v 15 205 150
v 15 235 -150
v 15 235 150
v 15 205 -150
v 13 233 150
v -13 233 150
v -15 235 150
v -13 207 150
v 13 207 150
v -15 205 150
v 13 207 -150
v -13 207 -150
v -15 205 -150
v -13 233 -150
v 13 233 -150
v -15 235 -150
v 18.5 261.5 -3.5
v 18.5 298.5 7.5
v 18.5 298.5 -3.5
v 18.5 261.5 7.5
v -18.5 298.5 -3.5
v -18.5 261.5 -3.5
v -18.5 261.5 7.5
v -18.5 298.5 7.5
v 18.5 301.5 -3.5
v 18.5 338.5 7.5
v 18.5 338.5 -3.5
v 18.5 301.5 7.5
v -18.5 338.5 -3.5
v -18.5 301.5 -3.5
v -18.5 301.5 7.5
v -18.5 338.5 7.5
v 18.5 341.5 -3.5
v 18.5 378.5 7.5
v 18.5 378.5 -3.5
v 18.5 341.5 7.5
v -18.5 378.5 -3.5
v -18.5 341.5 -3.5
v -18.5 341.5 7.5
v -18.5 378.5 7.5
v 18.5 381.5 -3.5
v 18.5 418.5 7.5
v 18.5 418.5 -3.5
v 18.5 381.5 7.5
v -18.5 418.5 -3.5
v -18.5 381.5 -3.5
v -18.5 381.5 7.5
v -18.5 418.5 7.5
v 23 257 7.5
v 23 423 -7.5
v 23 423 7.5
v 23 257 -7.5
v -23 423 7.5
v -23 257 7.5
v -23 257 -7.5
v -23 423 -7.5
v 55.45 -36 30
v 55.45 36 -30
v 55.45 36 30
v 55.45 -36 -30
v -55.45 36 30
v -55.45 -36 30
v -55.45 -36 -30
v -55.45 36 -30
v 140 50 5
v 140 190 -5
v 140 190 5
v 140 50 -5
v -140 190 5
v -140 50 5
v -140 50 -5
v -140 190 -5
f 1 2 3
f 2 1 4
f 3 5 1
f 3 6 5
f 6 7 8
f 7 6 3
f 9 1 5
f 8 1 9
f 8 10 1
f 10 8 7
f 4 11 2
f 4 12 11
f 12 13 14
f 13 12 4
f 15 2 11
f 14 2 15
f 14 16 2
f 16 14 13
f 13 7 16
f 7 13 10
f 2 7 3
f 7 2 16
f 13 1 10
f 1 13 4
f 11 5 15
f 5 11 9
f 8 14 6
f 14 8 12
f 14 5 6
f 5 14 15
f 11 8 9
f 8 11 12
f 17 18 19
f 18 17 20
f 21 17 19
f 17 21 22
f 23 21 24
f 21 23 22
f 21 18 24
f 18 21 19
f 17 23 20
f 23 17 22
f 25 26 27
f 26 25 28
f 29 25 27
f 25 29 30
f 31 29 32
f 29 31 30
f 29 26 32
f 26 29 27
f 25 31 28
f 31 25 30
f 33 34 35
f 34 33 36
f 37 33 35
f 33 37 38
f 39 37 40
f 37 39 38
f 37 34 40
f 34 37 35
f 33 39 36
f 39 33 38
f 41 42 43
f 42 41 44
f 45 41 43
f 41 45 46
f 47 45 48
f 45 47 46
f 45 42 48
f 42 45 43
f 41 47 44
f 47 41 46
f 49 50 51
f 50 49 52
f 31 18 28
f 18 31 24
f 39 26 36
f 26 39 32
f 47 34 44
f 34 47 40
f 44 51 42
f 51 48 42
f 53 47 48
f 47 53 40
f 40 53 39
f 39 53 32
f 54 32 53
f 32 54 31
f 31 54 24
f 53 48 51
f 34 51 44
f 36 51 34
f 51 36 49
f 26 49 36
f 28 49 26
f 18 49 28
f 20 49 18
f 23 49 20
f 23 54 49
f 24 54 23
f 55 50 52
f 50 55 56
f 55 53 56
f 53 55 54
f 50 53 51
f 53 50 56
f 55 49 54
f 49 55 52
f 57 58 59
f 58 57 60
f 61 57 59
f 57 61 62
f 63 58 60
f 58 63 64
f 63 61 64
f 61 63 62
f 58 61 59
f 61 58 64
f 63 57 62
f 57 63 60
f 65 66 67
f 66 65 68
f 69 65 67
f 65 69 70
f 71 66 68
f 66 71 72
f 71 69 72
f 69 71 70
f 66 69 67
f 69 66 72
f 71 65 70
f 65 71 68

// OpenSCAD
// Printable parts of the chess rig, parametric.
// Generated by hardware/generate.py from chess_sim - edit there, not here.
// All dimensions in millimetres.

board_square      = 28.0;
board_overall     = 254.0;
arm_riser_height  = 60.0;
arm_base_x        = 110.9;
arm_base_y        = 72.0;
mast_plate        = [280.0, 140.0, 10.0];
mast_tube         = 30.0;
mast_height       = 600.0;
tray_slots        = 4;
tray_pitch        = 40.0;
tray_wall         = 3.0;
tray_depth        = 12.0;

module arm_riser() { cube([arm_base_x, arm_base_y, arm_riser_height], center = true); }

module mast_plate() { cube(mast_plate, center = true); }

// print in two halves if the bed is shorter than the mast
module mast_tube(length = mast_height / 2, wall = 2) {
    difference() {
        cube([mast_tube, mast_tube, length], center = true);
        cube([mast_tube - 2 * wall, mast_tube - 2 * wall, length + 1], center = true);
    }
}

module capture_tray() {
    pocket = tray_pitch - tray_wall;
    difference() {
        cube([tray_pitch + 2 * tray_wall,
              tray_slots * tray_pitch + 2 * tray_wall,
              tray_depth + tray_wall], center = true);
        for (i = [0 : tray_slots - 1])
            translate([0,
                       (i - (tray_slots - 1) / 2) * tray_pitch,
                       tray_wall])
                cube([pocket, pocket, tray_depth + 1], center = true);
    }
}

arm_riser();
translate([0, 120, 0]) mast_plate();
translate([0, 220, 0]) mast_tube();
translate([0, 340, 0]) capture_tray();
